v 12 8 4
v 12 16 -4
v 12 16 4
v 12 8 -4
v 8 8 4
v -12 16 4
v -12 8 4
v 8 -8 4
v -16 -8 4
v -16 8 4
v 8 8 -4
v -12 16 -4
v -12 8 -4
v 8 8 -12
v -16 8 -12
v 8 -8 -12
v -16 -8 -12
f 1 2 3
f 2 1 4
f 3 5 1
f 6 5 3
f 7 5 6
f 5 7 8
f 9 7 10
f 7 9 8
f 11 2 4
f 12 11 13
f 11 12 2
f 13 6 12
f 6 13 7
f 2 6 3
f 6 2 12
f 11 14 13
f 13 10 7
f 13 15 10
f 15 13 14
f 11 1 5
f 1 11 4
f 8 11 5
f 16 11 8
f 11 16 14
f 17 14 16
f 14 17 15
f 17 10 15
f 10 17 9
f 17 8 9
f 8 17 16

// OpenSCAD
size=32; //block=32 //item=8

translate([0,size*0.375,0]){
cube([size*0.75,size*0.25,size*0.25],center=true);
};
translate([-size*0.125,0,-size*0.125]){
cube([size*0.75,size*0.5,size*0.5],center=true);
};
